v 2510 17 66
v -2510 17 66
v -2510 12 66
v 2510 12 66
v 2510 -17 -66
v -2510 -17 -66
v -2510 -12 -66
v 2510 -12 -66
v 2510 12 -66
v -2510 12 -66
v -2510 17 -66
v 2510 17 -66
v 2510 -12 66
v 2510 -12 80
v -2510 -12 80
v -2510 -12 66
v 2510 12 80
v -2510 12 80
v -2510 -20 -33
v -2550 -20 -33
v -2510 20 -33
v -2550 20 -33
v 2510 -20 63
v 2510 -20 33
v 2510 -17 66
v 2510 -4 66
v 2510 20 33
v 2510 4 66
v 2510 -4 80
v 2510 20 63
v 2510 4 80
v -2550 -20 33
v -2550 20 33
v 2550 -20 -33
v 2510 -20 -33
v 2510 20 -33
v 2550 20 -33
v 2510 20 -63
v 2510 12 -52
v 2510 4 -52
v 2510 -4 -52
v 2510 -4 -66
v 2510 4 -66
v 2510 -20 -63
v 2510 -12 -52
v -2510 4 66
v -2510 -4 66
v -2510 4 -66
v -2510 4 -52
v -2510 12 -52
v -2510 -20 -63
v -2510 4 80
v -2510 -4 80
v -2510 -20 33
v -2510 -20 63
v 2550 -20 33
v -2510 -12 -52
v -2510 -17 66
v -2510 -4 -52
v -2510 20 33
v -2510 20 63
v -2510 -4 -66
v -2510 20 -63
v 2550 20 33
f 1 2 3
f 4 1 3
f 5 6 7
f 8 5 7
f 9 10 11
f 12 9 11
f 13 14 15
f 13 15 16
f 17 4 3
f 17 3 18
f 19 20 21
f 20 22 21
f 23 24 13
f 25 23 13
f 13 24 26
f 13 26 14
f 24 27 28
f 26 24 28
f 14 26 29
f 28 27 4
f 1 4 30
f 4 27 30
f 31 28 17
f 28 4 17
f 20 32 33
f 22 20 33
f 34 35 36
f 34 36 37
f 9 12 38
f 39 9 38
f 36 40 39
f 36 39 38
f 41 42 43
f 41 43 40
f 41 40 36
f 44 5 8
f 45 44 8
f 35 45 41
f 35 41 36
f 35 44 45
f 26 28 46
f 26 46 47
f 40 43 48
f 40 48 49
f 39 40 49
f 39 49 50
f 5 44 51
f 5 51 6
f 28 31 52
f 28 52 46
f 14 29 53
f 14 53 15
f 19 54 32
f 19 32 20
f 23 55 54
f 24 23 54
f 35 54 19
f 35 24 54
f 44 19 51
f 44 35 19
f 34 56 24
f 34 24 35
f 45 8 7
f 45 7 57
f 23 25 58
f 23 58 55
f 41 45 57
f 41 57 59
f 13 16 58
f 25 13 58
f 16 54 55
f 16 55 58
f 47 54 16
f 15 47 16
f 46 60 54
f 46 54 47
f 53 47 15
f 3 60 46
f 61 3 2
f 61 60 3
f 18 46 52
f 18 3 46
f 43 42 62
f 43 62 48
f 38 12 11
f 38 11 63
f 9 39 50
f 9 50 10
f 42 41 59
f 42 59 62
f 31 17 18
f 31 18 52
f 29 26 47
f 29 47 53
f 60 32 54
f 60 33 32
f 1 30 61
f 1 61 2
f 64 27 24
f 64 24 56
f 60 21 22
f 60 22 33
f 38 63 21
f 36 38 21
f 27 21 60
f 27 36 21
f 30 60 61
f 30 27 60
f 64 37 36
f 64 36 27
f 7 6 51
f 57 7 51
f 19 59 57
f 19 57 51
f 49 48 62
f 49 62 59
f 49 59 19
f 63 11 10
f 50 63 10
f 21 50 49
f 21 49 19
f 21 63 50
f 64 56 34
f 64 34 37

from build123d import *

# Parameters (mm, degrees)
F1_W     = 40
F1_H     = 33
F3_DEPTH = 2550
F2_W     = 80
F2_H     = 100
F4_DEPTH = 25


with BuildPart() as f3:
    # F1 (on Right) → F3 (new body, symmetric)
    with BuildSketch(Plane.YZ):
        Polygon((20, 33), (20, 63), (17, 66), (12, 66), (12, 80), (4, 80), (4, 66), (-4, 66), (-4, 80), (-12, 80), (-12, 66), (-17, 66), (-20, 63), (-20, 33), align=None)
        with Locations((0, 16.5)):
            Rectangle(F1_W, F1_H)
        with Locations((0, -16.5)):
            Rectangle(F1_W, F1_H)
        Polygon((20, -63), (20, -33), (-20, -33), (-20, -63), (-17, -66), (-12, -66), (-12, -52), (-4, -52), (-4, -66), (4, -66), (4, -52), (12, -52), (12, -66), (17, -66), align=None)
    extrude(amount=F3_DEPTH, both=True)

    # F2 (on Front) → F4 (cut, symmetric)
    with BuildSketch(Plane.XZ):
        with Locations((-2550, 83)):
            Rectangle(F2_W, F2_H)
        with Locations((-2550, -83)):
            Rectangle(F2_W, F2_H)
        with Locations((2550, 83)):
            Rectangle(F2_W, F2_H)
        with Locations((2550, -83)):
            Rectangle(F2_W, F2_H)
    extrude(amount=F4_DEPTH, both=True, mode=Mode.SUBTRACT)


solid = f3.part
